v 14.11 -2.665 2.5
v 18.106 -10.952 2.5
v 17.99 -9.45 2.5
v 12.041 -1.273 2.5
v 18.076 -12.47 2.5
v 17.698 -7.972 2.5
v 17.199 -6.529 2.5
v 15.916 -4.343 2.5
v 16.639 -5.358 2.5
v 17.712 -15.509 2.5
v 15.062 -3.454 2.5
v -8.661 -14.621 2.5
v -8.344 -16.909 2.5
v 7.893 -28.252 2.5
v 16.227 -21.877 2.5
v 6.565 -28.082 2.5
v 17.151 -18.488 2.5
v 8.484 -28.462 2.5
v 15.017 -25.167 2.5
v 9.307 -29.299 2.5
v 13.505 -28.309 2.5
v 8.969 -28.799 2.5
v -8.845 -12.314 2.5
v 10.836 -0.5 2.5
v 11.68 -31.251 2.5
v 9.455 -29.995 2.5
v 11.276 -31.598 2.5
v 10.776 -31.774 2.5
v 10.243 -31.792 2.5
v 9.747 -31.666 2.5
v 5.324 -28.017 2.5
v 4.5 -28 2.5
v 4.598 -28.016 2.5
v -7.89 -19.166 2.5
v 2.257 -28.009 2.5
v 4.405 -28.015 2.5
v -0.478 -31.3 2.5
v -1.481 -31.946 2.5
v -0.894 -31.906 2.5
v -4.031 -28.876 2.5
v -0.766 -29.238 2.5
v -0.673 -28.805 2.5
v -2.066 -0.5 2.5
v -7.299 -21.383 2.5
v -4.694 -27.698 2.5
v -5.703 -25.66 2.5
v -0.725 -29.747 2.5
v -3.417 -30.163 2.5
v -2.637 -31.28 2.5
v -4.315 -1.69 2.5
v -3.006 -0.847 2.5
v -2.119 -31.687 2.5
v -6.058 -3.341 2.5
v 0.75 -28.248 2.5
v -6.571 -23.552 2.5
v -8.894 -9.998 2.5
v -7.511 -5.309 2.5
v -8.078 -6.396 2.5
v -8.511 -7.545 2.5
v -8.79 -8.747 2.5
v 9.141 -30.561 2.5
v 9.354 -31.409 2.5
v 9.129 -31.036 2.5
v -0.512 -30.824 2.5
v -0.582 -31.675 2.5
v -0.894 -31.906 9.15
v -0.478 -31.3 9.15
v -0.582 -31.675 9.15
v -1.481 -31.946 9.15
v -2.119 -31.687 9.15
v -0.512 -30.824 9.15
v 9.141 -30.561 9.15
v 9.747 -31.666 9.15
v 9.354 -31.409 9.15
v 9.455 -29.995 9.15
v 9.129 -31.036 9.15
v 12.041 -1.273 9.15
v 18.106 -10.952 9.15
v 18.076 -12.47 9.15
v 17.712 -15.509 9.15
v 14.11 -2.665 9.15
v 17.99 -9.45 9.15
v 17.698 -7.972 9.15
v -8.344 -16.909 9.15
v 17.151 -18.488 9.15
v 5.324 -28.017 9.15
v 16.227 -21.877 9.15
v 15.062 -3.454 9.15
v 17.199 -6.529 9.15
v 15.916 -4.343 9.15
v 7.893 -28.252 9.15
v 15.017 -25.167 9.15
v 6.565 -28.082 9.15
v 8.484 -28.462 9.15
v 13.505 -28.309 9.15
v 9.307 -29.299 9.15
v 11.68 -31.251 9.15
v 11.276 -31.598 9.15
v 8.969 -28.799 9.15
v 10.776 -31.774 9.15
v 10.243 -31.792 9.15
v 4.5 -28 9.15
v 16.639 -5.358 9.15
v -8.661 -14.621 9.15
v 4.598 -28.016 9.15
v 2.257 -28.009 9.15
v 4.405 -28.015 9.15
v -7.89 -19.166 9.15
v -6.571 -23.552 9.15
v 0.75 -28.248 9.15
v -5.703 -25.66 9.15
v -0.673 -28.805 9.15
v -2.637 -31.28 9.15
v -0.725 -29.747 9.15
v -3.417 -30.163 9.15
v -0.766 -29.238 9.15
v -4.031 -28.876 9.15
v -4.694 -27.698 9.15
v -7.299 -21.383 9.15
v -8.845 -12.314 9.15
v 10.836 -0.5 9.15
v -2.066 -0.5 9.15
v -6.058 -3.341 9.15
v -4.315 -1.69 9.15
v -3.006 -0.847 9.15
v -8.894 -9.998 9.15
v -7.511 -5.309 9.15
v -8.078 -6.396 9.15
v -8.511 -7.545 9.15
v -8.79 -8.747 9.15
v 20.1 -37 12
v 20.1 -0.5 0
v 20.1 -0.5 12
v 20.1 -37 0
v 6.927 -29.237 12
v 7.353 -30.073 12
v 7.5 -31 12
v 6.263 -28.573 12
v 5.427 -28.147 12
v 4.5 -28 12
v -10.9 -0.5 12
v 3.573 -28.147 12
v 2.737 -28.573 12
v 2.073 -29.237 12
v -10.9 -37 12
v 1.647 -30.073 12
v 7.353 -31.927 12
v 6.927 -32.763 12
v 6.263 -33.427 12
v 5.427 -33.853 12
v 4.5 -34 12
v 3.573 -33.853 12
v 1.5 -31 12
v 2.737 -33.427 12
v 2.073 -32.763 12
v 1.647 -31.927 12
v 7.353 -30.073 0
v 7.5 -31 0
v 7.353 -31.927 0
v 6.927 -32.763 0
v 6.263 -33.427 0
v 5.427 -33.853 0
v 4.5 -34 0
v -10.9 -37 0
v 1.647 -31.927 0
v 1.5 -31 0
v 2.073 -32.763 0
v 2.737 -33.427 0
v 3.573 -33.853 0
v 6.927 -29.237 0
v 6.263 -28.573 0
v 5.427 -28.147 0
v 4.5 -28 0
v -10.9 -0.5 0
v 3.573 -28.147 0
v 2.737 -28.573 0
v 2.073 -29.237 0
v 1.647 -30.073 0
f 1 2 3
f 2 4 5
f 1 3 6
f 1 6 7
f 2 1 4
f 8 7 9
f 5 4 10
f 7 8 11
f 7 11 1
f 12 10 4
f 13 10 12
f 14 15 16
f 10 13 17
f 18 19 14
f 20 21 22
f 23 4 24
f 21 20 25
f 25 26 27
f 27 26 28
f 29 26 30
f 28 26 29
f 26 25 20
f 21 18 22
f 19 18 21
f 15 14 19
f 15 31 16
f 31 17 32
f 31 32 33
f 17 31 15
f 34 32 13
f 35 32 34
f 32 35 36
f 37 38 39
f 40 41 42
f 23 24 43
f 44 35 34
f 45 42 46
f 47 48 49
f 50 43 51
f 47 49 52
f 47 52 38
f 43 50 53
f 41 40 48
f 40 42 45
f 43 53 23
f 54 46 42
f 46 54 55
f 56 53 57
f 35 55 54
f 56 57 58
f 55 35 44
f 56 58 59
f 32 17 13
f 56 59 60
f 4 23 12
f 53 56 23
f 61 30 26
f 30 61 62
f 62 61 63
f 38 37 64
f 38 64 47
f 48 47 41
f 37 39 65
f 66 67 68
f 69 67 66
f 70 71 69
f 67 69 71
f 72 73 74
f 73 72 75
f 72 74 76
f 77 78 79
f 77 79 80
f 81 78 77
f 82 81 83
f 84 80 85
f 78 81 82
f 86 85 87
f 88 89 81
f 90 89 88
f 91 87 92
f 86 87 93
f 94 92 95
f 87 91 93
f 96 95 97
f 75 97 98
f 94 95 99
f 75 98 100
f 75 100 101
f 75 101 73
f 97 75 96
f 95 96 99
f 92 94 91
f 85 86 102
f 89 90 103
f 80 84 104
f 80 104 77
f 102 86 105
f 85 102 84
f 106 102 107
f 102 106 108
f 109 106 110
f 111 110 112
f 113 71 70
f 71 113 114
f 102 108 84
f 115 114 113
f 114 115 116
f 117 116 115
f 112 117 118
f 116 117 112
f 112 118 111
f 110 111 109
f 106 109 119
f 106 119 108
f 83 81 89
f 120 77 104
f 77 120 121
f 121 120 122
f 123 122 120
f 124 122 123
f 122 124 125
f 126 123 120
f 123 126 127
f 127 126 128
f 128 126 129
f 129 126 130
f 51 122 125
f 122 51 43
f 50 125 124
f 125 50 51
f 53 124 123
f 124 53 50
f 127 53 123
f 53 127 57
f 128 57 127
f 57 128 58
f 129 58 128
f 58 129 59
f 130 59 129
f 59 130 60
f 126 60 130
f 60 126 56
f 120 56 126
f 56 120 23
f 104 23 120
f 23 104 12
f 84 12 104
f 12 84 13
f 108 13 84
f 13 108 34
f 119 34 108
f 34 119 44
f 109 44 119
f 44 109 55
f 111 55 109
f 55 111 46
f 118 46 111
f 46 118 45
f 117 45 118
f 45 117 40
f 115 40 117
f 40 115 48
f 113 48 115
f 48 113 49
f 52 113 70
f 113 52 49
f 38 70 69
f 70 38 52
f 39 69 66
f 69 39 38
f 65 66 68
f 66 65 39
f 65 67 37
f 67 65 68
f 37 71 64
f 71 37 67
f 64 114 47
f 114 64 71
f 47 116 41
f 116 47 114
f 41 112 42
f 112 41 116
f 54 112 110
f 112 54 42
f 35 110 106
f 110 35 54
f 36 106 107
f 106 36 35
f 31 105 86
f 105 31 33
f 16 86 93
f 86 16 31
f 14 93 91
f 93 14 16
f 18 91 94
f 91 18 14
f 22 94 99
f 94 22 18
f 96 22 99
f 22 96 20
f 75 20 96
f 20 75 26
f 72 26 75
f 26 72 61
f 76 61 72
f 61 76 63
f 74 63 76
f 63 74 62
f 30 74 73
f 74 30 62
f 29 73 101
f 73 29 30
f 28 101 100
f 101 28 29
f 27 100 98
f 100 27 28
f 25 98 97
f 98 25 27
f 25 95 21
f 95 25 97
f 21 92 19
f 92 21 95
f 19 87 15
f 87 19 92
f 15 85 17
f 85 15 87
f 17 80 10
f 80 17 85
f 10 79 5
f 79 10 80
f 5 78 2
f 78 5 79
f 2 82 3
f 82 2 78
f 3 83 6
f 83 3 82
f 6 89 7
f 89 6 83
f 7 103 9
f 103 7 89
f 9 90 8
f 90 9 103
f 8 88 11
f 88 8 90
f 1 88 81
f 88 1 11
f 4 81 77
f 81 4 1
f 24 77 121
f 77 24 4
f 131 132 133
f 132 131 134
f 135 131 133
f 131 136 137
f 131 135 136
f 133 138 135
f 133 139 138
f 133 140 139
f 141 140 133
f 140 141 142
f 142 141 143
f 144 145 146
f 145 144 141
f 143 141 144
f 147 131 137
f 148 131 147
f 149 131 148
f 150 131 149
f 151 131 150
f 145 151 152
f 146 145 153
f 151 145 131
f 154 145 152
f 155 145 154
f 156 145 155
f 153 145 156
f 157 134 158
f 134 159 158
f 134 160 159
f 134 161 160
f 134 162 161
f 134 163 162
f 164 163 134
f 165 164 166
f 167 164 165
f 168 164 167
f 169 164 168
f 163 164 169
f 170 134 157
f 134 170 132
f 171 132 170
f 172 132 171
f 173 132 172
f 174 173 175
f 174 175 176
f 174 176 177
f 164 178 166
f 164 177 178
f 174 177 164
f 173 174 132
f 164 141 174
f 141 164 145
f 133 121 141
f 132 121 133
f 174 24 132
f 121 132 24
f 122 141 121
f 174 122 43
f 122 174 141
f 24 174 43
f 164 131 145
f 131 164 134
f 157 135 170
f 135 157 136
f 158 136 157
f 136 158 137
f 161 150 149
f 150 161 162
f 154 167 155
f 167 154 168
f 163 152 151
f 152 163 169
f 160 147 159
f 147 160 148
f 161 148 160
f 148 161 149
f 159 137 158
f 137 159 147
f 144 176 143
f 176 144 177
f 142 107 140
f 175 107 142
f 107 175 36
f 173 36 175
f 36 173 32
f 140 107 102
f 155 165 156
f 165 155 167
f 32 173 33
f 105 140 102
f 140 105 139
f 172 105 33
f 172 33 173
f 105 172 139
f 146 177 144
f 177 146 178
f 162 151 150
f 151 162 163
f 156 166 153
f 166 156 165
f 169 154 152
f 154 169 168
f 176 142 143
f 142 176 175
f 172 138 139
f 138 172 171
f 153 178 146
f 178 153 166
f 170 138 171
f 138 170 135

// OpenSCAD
$fn=20;
thickness = 1.6;
epsilon = 0.1;

key_thickness = 6.65;
key_width = 26;
key_height = 31;

key_metal_base_width = 12;
key_metal_base_length = 13;
key_metal_thickness = 2.85;
key_metal_width = 9.2;
key_metal_length = 40;

/*translate([-((key_width-key_metal_width)/2),-key_height,0]) { 
        cube([key_width,key_height,key_thickness]);
    }
    */
    
    translate([0,0,2.5])
difference() {
  translate([-((key_width+5-key_metal_width)/2),-key_height-6,-2.5]) { 
        cube([key_width+5,key_height-0.5+6,12]);
  }
      key();
  
  translate([4.5,-31,0]) cylinder(h = 20, r=3, center = true);
}   
  
  
module key() {
color("darkblue") {

translate([30.5,34,0]) resize([key_width+1,key_height+1,key_thickness]) rotate([0,0,180]) linear_extrude(height = key_thickness, center = false)
   import (file = "Key_Head.dxf");    
}

translate([0,0,((key_thickness-key_metal_thickness)/2)])
color("gray") {
cube([key_metal_width, key_metal_length, key_metal_thickness]);

translate([-((key_metal_base_width-key_metal_width)/2),0,0]) cube([key_metal_base_width, key_metal_base_length, key_metal_thickness]);
}
}
